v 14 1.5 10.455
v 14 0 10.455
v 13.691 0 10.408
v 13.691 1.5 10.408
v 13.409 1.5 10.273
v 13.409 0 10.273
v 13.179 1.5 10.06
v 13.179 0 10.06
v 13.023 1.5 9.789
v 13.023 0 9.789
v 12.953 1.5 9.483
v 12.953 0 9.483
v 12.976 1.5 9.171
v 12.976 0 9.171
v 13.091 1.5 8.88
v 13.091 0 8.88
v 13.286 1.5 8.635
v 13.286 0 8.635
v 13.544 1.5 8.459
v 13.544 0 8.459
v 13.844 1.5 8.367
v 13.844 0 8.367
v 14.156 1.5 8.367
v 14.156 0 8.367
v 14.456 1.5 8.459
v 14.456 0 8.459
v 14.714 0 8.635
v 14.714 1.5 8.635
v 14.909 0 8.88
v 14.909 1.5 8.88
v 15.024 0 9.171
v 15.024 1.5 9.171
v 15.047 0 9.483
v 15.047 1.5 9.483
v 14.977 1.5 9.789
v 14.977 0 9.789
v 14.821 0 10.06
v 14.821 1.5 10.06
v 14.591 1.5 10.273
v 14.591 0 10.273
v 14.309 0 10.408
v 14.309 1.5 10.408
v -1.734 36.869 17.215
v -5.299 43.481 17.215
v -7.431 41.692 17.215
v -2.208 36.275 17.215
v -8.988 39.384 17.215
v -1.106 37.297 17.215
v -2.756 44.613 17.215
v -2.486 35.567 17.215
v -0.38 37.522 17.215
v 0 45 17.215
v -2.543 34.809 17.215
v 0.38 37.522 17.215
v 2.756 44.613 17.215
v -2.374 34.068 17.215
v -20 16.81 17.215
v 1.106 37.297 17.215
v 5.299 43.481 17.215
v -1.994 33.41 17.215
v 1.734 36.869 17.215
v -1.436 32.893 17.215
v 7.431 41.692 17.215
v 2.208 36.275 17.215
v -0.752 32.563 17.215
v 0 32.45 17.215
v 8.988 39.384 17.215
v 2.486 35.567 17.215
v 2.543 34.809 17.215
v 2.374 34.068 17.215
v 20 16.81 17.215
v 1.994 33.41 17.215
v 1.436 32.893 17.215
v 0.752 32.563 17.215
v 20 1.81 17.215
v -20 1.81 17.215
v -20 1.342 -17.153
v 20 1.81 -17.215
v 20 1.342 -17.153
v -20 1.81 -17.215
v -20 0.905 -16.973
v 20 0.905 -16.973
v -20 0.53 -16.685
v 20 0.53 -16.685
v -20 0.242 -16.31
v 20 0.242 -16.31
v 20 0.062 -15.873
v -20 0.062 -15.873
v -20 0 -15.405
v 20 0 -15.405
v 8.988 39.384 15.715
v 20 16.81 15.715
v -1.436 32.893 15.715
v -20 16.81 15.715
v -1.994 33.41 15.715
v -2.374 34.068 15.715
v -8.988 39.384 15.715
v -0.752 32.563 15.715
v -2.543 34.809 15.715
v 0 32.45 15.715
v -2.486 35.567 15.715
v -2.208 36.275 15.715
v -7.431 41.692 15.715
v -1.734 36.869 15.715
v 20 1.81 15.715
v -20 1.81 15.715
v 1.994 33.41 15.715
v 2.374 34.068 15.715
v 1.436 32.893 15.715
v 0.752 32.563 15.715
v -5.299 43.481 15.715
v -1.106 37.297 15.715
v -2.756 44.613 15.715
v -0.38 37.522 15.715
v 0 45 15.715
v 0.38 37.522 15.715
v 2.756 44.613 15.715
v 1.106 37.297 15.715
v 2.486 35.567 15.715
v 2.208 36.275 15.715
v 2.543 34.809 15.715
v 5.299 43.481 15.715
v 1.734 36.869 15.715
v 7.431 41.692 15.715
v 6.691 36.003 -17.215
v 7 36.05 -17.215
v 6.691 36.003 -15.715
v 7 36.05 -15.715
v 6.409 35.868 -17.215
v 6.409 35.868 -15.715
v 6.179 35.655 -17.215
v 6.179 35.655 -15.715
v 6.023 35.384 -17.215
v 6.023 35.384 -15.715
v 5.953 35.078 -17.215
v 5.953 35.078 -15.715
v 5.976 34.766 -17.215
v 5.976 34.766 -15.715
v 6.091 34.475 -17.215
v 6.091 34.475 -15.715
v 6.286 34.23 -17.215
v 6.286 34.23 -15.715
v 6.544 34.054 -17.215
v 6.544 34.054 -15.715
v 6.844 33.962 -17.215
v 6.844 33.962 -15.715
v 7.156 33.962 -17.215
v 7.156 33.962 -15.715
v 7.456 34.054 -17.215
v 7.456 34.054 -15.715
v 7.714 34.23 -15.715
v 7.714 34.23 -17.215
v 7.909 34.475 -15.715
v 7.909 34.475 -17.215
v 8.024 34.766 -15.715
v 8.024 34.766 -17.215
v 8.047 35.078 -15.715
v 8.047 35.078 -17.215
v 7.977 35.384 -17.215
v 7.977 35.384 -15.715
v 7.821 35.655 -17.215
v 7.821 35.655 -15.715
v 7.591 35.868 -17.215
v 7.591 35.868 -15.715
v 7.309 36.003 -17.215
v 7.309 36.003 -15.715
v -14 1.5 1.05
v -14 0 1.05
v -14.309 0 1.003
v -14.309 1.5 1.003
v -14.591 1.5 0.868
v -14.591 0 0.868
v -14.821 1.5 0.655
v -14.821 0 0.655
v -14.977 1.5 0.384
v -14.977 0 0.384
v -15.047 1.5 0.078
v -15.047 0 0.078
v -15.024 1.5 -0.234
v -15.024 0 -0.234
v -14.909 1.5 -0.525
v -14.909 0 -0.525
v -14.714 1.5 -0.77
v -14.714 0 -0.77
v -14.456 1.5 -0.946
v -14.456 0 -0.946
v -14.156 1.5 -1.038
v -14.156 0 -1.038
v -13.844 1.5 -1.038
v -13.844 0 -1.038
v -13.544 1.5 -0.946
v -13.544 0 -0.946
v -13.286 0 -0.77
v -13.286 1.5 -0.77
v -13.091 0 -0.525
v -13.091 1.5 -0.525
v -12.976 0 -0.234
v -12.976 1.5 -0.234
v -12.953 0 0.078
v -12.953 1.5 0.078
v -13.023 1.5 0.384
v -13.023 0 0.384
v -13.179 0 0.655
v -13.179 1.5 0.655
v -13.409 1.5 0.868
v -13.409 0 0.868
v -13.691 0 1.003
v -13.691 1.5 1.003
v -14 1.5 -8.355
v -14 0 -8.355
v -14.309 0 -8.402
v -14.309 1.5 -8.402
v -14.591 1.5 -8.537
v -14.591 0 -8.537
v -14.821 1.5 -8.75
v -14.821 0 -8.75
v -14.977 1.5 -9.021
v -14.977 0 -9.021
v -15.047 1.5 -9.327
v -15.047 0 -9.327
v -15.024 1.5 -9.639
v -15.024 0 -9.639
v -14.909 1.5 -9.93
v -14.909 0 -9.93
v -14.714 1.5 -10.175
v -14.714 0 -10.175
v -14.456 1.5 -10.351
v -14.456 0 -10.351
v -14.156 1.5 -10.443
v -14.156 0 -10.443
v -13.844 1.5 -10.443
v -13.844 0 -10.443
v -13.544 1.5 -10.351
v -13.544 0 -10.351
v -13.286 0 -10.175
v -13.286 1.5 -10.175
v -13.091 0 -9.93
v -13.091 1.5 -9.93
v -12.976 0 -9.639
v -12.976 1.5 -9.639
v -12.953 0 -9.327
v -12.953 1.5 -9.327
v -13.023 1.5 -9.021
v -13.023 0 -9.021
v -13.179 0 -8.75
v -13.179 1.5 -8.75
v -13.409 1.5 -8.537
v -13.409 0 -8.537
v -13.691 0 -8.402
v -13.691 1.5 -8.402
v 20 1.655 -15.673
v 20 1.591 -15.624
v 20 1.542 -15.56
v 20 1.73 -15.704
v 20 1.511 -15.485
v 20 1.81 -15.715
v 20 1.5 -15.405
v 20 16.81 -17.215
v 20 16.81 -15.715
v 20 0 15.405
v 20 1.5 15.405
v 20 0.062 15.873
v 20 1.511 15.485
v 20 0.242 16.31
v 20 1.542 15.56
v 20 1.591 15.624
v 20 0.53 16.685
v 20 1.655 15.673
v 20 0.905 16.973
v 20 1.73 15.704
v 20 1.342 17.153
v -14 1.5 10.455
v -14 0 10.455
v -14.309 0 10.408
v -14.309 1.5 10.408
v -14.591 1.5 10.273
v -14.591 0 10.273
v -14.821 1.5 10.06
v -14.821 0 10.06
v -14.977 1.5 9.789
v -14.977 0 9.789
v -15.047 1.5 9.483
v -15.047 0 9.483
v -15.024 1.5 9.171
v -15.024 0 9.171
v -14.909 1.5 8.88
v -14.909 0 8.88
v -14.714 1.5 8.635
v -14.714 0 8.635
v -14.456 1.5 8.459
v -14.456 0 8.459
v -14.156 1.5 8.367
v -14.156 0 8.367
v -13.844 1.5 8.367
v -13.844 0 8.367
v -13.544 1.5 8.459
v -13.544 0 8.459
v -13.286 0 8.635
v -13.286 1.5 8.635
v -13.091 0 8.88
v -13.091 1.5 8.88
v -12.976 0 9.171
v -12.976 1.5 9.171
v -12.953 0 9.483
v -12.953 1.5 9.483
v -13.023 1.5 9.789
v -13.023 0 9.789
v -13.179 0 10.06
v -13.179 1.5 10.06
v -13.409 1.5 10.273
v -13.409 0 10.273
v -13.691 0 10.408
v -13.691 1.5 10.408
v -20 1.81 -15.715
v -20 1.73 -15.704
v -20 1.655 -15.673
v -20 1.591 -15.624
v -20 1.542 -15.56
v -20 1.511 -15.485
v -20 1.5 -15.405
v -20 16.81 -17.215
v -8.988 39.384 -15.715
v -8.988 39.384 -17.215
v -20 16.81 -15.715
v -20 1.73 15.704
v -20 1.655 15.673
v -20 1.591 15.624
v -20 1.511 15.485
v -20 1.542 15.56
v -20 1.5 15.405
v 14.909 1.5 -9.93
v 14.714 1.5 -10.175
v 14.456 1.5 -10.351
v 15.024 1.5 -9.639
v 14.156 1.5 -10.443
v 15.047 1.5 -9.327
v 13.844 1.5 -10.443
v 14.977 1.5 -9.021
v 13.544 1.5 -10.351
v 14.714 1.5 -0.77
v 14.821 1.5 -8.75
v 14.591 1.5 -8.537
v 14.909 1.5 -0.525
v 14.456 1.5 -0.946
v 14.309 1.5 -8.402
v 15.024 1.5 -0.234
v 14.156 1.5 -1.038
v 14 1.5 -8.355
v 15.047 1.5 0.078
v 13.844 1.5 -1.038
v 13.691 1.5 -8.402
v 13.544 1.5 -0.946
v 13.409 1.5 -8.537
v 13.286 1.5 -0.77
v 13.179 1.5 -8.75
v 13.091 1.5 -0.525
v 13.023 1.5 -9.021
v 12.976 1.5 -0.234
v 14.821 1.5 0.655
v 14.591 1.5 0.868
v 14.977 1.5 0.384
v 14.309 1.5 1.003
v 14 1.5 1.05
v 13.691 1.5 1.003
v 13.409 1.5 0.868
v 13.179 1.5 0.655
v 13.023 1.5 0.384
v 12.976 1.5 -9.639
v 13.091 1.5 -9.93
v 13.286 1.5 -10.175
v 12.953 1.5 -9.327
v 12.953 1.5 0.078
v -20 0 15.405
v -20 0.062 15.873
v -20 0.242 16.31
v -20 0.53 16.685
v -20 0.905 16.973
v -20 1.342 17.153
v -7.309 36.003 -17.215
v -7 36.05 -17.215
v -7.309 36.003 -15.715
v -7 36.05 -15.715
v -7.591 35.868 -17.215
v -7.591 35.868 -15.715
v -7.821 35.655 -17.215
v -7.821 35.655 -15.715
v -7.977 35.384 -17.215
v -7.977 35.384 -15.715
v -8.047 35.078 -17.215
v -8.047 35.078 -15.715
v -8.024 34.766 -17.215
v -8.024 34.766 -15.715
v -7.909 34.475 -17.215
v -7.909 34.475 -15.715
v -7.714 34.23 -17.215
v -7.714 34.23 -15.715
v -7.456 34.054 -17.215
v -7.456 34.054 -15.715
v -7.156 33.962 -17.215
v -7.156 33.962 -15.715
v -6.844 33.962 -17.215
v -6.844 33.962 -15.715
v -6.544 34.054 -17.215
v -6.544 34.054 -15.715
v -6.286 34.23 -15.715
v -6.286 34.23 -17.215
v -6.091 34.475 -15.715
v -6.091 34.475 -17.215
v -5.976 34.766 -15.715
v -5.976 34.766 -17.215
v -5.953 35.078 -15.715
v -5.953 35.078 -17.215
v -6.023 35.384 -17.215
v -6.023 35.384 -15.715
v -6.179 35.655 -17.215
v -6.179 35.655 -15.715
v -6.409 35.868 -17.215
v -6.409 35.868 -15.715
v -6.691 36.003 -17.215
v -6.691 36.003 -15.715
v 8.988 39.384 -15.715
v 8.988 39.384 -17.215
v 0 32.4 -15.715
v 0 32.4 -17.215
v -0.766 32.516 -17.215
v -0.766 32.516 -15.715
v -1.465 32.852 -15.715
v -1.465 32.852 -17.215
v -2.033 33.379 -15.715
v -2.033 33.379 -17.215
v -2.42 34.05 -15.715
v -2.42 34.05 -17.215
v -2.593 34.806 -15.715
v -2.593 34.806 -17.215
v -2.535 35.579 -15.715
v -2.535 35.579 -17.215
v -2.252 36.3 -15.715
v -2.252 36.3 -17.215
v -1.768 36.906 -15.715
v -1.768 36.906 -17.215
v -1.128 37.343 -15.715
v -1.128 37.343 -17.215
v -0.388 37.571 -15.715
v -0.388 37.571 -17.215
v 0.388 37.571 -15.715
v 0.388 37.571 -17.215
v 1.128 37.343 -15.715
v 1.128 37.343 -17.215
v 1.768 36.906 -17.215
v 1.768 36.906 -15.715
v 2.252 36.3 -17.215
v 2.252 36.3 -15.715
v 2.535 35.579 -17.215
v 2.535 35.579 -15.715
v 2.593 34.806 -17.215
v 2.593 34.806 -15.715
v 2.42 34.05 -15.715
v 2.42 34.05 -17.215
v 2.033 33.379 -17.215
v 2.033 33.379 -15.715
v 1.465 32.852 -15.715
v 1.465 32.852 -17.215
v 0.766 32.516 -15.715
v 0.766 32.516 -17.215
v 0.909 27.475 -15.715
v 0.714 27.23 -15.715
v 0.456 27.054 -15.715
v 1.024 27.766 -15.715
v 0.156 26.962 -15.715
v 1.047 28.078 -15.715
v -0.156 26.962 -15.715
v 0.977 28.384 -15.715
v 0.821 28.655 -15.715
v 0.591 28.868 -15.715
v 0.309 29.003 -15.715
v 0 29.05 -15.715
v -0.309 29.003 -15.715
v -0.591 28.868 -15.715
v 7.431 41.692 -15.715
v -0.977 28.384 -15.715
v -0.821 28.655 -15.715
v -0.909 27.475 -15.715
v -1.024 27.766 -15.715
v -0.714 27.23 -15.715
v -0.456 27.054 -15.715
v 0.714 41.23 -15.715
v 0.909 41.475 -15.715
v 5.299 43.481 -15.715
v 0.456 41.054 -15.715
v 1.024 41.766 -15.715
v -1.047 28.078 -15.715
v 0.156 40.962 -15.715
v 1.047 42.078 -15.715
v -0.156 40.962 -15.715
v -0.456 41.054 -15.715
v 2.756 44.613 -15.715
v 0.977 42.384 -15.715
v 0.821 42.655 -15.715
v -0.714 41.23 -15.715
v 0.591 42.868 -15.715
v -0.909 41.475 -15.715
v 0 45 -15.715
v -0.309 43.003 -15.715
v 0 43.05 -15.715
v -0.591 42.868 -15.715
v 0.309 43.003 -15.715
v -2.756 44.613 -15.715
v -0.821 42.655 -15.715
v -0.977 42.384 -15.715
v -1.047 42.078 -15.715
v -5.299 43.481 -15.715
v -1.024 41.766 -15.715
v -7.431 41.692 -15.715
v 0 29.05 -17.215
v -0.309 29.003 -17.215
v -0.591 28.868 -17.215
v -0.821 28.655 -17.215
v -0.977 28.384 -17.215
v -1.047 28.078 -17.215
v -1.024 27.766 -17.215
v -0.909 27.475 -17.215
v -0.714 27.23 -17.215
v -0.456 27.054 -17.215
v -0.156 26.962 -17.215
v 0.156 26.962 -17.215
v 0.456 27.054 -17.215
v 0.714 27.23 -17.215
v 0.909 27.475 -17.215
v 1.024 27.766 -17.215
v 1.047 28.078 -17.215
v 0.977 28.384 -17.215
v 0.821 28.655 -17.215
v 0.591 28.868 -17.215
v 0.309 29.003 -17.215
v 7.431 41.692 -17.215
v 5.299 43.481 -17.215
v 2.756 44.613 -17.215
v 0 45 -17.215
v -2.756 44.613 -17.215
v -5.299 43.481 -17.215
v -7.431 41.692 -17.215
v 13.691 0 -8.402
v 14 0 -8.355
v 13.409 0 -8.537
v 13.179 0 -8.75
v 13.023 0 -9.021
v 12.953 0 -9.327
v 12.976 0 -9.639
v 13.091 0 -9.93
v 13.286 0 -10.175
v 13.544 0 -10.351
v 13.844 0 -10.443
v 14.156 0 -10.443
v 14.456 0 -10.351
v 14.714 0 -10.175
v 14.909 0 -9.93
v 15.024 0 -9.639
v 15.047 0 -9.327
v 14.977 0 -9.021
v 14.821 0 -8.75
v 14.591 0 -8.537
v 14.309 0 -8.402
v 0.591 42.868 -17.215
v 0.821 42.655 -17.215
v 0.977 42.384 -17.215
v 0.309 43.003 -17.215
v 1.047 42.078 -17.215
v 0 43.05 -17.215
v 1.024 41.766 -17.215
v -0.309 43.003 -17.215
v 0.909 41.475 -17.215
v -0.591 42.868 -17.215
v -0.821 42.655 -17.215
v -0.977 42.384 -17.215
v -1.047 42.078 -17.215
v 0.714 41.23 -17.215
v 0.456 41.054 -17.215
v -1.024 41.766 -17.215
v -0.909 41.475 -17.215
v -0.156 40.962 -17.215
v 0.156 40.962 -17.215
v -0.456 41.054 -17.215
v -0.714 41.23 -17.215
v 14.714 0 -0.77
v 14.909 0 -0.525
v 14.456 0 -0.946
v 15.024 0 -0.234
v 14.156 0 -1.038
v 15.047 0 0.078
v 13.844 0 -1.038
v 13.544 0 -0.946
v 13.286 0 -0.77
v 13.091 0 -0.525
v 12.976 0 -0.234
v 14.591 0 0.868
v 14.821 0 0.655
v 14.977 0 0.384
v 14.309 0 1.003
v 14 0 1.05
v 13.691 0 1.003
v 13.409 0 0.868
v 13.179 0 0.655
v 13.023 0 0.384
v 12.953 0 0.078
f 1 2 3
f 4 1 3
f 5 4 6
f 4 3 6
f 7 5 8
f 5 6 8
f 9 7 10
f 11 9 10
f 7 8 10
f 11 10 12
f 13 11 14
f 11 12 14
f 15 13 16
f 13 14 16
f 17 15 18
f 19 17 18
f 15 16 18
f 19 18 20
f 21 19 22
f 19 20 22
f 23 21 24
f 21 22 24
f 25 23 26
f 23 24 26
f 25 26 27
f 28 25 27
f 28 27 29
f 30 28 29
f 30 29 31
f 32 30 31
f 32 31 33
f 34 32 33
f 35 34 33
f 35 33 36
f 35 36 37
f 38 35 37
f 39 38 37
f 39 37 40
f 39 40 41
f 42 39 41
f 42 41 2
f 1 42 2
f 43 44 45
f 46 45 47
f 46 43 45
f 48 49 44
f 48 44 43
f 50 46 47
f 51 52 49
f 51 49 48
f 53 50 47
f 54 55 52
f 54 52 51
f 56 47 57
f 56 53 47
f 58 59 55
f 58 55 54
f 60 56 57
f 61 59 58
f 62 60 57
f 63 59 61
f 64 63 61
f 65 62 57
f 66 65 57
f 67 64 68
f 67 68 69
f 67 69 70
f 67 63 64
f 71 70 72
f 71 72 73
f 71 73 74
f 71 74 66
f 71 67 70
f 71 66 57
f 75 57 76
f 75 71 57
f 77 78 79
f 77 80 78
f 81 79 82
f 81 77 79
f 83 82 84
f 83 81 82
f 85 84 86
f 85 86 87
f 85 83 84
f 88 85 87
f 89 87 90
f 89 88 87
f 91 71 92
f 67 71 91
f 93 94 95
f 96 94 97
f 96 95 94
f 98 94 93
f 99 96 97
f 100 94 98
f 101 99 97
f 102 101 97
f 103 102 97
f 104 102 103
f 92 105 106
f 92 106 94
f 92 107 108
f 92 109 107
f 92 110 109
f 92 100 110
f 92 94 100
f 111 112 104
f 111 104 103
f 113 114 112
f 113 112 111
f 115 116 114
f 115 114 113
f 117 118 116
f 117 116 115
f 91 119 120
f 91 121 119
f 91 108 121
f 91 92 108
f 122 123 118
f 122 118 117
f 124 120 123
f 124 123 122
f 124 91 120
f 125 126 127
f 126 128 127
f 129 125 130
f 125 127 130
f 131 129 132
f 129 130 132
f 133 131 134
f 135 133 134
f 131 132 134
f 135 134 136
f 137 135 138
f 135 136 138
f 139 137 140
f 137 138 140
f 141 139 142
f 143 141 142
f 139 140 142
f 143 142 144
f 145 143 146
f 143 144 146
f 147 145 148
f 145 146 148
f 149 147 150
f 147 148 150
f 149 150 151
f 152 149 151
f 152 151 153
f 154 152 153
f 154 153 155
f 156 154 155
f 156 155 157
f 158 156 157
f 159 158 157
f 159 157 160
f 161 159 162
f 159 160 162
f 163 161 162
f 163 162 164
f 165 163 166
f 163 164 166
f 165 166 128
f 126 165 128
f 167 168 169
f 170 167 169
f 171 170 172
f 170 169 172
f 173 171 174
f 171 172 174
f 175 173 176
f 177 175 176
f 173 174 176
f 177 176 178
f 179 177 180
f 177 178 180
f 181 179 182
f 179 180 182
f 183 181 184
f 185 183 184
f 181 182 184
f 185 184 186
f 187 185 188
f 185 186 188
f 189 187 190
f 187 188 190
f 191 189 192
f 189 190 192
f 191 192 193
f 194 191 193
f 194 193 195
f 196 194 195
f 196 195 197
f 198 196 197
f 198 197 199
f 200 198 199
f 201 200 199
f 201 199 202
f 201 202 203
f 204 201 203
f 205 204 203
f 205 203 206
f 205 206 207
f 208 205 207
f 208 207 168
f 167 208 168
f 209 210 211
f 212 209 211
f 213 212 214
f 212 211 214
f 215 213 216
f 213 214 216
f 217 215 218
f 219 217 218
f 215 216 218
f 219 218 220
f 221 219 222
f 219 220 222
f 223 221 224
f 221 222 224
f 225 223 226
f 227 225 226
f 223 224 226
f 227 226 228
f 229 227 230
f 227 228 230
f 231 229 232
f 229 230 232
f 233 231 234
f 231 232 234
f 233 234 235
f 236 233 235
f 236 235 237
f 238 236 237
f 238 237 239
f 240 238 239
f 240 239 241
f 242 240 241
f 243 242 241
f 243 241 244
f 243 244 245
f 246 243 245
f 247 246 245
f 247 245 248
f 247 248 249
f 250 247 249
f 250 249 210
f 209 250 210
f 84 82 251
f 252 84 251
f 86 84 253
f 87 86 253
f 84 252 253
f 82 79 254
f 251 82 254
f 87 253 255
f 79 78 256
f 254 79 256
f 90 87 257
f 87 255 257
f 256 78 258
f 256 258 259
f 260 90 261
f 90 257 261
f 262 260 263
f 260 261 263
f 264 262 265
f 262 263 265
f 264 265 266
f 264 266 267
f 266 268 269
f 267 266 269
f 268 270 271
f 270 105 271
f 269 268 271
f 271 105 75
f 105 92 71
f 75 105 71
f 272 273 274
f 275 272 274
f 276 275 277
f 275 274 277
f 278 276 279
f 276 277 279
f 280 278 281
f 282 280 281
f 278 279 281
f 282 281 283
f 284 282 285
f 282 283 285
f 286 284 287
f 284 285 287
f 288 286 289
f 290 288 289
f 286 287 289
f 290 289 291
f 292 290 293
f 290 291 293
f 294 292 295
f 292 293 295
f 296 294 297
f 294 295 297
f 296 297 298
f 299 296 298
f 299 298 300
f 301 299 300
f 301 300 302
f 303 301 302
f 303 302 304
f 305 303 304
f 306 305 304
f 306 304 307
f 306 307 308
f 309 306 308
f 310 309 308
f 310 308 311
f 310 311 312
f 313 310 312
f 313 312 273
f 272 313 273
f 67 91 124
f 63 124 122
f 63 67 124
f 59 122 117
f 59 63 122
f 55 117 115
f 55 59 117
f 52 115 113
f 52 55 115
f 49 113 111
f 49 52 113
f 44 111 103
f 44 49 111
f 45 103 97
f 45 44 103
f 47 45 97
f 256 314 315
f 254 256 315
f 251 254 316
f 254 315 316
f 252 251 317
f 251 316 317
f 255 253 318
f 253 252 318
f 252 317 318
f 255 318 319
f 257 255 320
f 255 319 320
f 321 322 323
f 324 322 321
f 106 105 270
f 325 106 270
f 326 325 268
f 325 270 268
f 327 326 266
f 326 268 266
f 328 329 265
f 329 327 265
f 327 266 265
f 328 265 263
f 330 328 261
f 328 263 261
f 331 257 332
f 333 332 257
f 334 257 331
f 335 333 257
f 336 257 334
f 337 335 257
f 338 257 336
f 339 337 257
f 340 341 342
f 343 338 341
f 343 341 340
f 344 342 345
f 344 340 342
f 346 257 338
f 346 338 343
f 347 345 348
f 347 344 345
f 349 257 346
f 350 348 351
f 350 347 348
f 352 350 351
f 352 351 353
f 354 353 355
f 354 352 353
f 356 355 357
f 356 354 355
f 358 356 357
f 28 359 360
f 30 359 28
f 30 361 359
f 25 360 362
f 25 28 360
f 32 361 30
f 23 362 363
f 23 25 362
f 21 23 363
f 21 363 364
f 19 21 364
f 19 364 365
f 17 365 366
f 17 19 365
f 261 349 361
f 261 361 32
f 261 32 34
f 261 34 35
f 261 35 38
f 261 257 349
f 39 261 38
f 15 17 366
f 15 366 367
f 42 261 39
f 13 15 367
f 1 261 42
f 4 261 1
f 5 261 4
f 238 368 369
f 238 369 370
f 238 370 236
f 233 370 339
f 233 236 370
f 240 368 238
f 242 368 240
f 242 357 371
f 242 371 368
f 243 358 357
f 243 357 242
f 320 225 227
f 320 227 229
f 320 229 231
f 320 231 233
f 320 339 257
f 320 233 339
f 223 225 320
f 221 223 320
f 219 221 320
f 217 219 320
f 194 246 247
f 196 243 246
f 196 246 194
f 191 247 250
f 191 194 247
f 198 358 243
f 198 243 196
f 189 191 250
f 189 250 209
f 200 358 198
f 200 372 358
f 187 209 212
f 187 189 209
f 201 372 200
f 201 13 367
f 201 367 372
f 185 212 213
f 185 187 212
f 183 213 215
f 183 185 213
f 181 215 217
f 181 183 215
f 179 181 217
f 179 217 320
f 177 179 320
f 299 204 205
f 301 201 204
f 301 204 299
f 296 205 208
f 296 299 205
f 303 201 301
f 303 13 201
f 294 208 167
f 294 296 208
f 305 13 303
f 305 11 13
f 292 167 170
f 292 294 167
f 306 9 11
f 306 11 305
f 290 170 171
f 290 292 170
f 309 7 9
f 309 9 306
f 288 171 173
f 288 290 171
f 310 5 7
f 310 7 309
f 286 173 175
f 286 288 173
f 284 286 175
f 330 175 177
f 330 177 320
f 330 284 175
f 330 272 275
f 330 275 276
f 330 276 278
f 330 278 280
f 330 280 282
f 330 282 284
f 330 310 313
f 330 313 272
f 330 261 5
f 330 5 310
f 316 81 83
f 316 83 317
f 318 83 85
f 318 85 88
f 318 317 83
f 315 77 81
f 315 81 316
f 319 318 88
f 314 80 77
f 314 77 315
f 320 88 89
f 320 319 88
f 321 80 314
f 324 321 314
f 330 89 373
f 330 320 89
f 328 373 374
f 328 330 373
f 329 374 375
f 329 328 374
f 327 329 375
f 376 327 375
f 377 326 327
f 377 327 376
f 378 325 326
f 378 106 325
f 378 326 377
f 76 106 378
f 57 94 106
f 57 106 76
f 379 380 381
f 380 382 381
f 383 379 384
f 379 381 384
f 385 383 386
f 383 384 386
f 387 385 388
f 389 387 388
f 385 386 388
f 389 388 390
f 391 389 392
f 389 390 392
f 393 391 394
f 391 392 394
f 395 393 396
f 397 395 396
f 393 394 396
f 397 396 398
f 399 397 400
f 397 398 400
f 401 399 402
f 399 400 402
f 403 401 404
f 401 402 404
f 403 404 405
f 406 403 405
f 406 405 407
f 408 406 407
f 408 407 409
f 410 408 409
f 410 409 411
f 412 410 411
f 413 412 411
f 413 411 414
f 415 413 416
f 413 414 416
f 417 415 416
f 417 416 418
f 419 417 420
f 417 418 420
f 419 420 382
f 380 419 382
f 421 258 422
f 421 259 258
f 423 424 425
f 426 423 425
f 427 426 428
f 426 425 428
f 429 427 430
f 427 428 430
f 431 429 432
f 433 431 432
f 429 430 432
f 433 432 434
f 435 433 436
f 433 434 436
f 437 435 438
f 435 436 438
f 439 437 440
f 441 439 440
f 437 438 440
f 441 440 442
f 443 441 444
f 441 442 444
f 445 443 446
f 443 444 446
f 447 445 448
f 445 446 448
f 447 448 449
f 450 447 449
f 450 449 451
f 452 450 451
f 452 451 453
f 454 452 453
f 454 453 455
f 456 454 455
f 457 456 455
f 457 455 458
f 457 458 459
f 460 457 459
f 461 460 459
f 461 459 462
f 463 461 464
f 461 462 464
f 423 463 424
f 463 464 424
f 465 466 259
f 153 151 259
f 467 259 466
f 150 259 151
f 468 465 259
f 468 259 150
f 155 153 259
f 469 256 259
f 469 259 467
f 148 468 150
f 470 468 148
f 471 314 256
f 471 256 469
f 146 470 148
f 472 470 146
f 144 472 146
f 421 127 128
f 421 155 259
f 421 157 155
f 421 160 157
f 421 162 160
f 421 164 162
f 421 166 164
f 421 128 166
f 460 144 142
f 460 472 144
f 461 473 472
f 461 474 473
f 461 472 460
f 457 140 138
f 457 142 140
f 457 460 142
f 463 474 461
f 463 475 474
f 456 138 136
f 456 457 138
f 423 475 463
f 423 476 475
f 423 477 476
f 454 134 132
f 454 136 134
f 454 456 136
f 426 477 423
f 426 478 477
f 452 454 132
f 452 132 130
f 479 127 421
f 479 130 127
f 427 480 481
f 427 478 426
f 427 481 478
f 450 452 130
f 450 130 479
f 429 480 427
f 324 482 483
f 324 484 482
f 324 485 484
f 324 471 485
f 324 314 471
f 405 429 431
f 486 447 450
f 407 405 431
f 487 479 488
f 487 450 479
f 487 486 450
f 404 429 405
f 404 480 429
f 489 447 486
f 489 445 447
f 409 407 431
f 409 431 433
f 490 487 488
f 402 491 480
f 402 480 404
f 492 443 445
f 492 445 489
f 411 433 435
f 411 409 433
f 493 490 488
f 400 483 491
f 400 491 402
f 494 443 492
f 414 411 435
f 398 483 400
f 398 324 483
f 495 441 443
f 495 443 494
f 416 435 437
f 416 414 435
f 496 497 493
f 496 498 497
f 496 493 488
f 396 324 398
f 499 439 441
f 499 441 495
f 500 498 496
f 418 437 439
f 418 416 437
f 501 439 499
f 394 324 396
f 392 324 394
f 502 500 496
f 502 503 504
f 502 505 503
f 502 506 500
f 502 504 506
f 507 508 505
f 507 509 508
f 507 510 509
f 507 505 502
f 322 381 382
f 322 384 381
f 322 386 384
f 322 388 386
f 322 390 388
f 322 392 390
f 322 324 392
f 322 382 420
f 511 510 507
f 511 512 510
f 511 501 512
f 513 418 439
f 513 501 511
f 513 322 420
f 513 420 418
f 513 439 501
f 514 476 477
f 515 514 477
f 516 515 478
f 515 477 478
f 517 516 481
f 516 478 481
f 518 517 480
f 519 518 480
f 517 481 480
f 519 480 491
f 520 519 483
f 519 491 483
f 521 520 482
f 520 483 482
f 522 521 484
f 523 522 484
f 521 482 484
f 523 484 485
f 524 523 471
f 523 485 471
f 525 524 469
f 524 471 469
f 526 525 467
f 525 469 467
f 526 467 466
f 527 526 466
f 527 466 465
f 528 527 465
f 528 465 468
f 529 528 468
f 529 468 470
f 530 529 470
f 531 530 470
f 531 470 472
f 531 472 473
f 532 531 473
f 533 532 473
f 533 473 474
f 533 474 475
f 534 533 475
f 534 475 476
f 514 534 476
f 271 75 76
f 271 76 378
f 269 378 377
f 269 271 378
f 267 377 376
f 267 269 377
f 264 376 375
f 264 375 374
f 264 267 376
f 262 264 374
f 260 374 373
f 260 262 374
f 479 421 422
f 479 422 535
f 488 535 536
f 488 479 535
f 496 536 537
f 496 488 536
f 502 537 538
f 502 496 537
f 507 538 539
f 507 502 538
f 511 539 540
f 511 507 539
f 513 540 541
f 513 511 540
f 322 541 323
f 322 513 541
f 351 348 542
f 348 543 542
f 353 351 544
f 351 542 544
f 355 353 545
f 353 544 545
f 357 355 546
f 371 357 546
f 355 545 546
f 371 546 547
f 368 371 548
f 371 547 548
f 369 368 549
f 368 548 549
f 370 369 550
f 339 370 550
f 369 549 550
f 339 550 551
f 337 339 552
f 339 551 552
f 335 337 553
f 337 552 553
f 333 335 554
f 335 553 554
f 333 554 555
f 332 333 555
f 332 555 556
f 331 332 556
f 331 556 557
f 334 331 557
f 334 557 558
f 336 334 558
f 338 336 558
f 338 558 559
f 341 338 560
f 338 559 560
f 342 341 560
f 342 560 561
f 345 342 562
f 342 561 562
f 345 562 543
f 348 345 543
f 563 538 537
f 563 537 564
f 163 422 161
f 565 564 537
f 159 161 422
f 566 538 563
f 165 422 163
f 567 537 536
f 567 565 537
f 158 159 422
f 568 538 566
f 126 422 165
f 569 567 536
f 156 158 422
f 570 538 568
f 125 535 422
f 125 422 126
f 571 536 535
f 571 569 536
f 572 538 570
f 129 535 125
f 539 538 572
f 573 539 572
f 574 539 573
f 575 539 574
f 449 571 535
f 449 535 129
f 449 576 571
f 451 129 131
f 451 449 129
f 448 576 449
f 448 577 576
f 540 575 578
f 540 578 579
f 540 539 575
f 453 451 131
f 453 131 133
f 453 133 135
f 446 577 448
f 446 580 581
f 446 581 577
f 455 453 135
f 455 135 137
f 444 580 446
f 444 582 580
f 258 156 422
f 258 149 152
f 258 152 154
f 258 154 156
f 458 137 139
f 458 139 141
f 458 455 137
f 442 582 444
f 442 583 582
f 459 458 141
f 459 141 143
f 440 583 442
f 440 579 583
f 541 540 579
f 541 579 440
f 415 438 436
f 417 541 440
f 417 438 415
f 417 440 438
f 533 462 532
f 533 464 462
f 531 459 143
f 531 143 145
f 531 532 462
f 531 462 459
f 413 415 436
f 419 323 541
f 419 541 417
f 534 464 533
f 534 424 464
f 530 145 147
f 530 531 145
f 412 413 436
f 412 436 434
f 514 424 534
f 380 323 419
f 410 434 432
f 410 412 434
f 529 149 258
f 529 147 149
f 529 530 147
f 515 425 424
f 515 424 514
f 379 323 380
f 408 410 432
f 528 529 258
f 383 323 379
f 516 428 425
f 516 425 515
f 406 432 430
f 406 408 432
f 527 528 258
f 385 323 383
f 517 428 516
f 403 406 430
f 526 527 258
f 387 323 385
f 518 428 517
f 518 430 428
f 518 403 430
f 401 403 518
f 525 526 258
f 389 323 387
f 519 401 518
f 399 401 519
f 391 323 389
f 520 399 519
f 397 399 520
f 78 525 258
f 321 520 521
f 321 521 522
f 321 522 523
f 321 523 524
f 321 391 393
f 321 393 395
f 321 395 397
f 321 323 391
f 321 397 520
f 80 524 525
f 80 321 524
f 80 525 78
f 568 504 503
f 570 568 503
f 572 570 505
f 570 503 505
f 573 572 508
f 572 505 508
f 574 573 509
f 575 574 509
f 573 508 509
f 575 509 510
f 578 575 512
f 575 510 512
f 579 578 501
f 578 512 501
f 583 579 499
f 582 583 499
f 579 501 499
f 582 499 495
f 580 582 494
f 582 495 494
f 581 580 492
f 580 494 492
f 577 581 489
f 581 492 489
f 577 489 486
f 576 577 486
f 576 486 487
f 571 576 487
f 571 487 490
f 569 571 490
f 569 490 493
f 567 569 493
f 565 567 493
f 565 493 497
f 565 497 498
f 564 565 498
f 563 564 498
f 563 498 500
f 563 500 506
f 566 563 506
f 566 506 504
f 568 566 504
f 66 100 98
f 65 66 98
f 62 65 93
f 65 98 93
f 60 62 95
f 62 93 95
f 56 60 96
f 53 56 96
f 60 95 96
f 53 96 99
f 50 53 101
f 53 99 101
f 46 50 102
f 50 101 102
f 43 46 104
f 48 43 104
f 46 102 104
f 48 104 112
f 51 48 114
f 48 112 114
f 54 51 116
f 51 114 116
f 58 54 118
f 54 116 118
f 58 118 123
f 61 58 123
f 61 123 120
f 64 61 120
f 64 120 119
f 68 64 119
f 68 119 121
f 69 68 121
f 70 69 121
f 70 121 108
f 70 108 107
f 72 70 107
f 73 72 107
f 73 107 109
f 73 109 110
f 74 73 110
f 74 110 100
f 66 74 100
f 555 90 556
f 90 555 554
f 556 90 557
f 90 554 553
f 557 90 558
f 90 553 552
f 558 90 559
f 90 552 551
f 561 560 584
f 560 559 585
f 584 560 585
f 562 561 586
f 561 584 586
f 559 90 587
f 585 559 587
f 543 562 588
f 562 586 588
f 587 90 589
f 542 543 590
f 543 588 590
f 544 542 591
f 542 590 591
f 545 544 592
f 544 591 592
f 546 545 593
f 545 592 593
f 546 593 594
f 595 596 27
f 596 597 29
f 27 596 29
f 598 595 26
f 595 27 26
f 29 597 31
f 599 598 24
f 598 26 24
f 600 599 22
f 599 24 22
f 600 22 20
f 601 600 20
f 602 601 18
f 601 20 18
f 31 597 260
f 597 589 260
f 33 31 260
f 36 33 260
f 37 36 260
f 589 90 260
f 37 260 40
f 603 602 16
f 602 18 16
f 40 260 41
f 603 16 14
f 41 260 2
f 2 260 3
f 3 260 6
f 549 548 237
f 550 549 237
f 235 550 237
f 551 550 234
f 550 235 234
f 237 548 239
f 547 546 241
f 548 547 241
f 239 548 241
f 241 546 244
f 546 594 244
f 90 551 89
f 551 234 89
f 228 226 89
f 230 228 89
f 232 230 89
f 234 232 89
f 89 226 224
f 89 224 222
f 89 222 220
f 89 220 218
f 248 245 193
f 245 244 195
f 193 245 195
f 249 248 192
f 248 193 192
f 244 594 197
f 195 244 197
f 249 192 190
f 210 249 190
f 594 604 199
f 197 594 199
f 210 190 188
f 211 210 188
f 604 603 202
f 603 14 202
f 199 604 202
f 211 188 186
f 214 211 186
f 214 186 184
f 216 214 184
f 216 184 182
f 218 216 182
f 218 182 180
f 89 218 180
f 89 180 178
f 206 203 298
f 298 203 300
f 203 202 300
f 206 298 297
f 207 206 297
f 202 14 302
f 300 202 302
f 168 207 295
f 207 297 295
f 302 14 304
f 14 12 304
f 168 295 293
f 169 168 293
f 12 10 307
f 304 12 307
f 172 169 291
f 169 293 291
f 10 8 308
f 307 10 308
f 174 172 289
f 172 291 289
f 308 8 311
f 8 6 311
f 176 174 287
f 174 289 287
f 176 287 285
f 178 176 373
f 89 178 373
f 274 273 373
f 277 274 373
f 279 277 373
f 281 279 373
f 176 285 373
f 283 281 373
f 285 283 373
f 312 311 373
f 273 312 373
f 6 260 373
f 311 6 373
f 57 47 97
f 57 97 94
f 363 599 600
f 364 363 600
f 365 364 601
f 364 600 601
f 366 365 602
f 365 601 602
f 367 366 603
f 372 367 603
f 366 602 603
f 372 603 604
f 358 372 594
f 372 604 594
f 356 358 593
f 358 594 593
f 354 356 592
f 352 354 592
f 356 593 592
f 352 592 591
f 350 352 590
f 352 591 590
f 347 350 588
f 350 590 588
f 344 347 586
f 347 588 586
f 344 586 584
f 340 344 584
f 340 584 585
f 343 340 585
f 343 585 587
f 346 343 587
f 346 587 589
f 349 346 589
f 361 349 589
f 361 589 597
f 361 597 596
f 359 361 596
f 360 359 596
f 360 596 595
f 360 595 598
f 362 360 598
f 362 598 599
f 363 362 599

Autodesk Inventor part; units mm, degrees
ref_plane "YZ Plane" through (0, 0, 0) normal (1, 0, 0) x (0, 1, 0)
ref_plane "XZ Plane" through (0, 0, 0) normal (0, 1, 0) x (-1, 0, 0)
ref_plane "XY Plane" through (0, 0, 0) normal (0, 0, 1) x (1, 0, 0)
sketch "Sketch1" plane through (0, 0, 0) normal (0, 1, 0) x (-1, 0, 0)
  line L0 (20, -15.715) -> (-20, -15.715)
  line L1 (-20, -15.715) -> (-20, 15.715)
  line L2 (-20, 15.715) -> (20, 15.715)
  line L3 (20, 15.715) -> (20, -15.715)
  point P0 (0, 0)
  dimension "d0" = 40
  dimension "d1" = 20
  dimension "d2" = 31.43
  dimension "d3" = 15.715
extrude "Plate1" add sketch "Sketch1" along normal blind 1.5
sketch "Sketch2" plane through (20, 0, 17.215) normal (0, 0, -1) x (-1, 0, 0)
  line L0 (40, 0) -> (0, 0)
  line L1 (0, 0) -> (0, 45)
  line L2 (0, 45) -> (40, 45)
  line L3 (40, 45) -> (40, 0)
edge flange "Flange1" height 45 angle 90 thickness 1.5 bend radius 0.31 thickness toward (0, 0, -1) relief tear relief width 1.5 relief depth 0.75 edges at (0, 1.5, 15.715) wall of the first edge with corners at (-20, 0, 17.215) (20, 0, 17.215) (20, 45, 17.215) (-20, 45, 17.215)
bend "Bend1"
corner "Corner1"
sketch "Sketch3" plane through (-20, 0, -17.215) normal (0, 0, 1) x (1, 0, 0)
  line L0 (40, 0) -> (0, 0)
  line L1 (0, 0) -> (0, 45)
  line L2 (0, 45) -> (40, 45)
  line L3 (40, 45) -> (40, 0)
edge flange "Flange2" height 45 angle 90 thickness 1.5 bend radius 0.31 thickness toward (0, 0, 1) relief tear relief width 1.5 relief depth 0.75 edges at (0, 1.5, -15.715) wall of the first edge with corners at (20, 0, -17.215) (-20, 0, -17.215) (-20, 45, -17.215) (20, 45, -17.215)
bend "Bend2"
corner "Corner2"
sketch "Sketch4" plane through (-20, 45, 17.215) normal (0, 0, 1) x (1, 0, 0)
  line L0 (0, -43.19) -> (0, 0) projected
  line L1 (0, 0) -> (40, 0) projected
  line L2 (40, 0) -> (40, -43.19) projected
  line L3 (0, -43.19) -> (40, -43.19) projected
  arc A0 (28.9876, -5.6156) -> (11.0124, -5.6156) centre (20, -10) ccw
  line L4 (0, -38.19) -> (40, -38.19)
  line L5 (40, -38.19) -> (40, -28.19)
  line L6 (40, -28.19) -> (0, -28.19)
  line L7 (0, -28.19) -> (0, -38.19)
  line L8 (40, -28.19) -> (28.9876, -5.6156)
  line L9 (11.0124, -5.6156) -> (0, -28.19)
  point P0 (0, -28.19)
  point P1 (20, 0)
  point P2 (40, -28.19)
  dimension "d50" = 10
  dimension "d51" = 20
  dimension "d52" = 20
  dimension "d53" = 38.19
  dimension "d54" = 10
  dimension "d55" = 40
  dimension "d56" = 40
extrude "Extrusion1" cut sketch "Sketch4" against normal blind 50 contours L0 L1 A0 L9 | L8 A0 L1 L2
sketch "Sketch6" plane through (-20, 1.81, 17.215) normal (0, 0, 1) x (1, 0, 0)
  arc A0 (28.9876, 37.5744) -> (11.0124, 37.5744) centre (20, 33.19) ccw projected
  point P0 (20, -1.81)
hole "Hole2" at (0, 35, 17.215) direction (0, 0, -1) diameter 5.1 depth 1.5 clearance for "Hex Head Bolt" size "M5" standard "Ansi Metric M Profile"
sketch "Sketch7" plane through (-20, 1.81, -15.715) normal (0, 0, 1) x (1, 0, 0)
  arc A0 (28.9876, 37.5744) -> (11.0124, 37.5744) centre (20, 33.19) ccw projected
  point P0 (20, -1.81)
hole "Hole3" at (0, 35, -15.715) direction (0, 0, -1) diameter 5.2 depth 1.5 clearance for "Hex Head Bolt" size "M5" standard "Ansi Metric M Profile"
sketch "Sketch8" plane through (0, 1.5, 0) normal (0, 1, 0) x (1, 0, 0)
  line L0 (20, 15.405) -> (20, -15.405) projected
  line L1 (20, -15.715) -> (-20, -15.715) projected
  line L2 (-20, -15.405) -> (20, -15.405) projected
  line L3 (20, 15.405) -> (-20, 15.405) projected
  point P0 (0, 0)
  point P1 (14, -9.405)
  point P2 (-14, -9.405)
  point P3 (14, 0)
  point P4 (-14, 0)
  point P5 (14, 9.405)
  point P6 (-14, 9.405)
  dimension "d71" = 6
  dimension "d73" = 6
  dimension "d76" = 28
  dimension "d79" = 9.405
hole "Hole4" at (14, 1.5, 9.405) at (-14, 1.5, 9.405) at (14, 1.5, 0) at (-14, 1.5, 0) at (14, 1.5, -9.405) at (-14, 1.5, -9.405) direction (0, -1, 0) diameter 2.1 depth 1.5
sketch "Sketch9" plane through (20, 1.81, -17.215) normal (0, 0, -1) x (-1, 0, 0)
  arc A0 (28.9876, 37.5744) -> (11.0124, 37.5744) centre (20, 33.19) ccw projected
  circle A1 centre (20, 40.19) radius 1.05
  circle A2 centre (13, 33.19) radius 1.05
  circle A3 centre (20, 26.19) radius 1.05
  circle A4 centre (27, 33.19) radius 1.05
  point P0 (20, -1.81)
  dimension "d89" = 7
  dimension "d90" = 0
  dimension "d91" = 2.1
  dimension "d94" = 360
hole "Hole5" at (0, 28, -17.215) at (7, 35, -17.215) at (-7, 35, -17.215) at (0, 42, -17.215) direction (0, 0, 1) diameter 2.1 depth 1.5
equation "\"d62\" = Thickness"
equation "\"d69\" = Thickness"
equation "\"d87\" = Thickness"
equation "\"d101\" = Thickness"
equation "\"d4\" = Thickness"
equation "\"d5\" = BendReliefWidth"
equation "\"d6\" = BendReliefDepth"
equation "\"d7\" = MinimumRemnant"
equation "\"d8\" = TransitionRadius"
equation "\"d11\" = BendRadius"
equation "\"d12\" = CornerReliefSize"
equation "\"d13\" = GapSize"
equation "\"d14\" = JacobiRadiusSize"
equation "\"d15\" = BendReliefWidth"
equation "\"d16\" = BendReliefDepth"
equation "\"d17\" = MinimumRemnant"
equation "\"d18\" = TransitionRadius"
equation "\"d21\" = BendRadius"
equation "\"d22\" = CornerReliefSize"
equation "\"d23\" = GapSize"
equation "\"d24\" = JacobiRadiusSize"
equation "\"BendReliefWidth\" = Thickness"
equation "\"BendReliefDepth\" = 0.5 * Thickness"
equation "\"CornerReliefSize\" = 4 * Thickness"
equation "\"MinimumRemnant\" = 2 * Thickness"
equation "\"TransitionRadius\" = BendRadius"
equation "\"JacobiRadiusSize\" = BendRadius"
equation "\"GapSize\" = Thickness"
equation "\"Thickness\" = 1.5"
equation "\"BendRadius\" = 0.31"
properties part number "axis_12_bottom_frame(top)" material "Aluminum 6061-AHC"
